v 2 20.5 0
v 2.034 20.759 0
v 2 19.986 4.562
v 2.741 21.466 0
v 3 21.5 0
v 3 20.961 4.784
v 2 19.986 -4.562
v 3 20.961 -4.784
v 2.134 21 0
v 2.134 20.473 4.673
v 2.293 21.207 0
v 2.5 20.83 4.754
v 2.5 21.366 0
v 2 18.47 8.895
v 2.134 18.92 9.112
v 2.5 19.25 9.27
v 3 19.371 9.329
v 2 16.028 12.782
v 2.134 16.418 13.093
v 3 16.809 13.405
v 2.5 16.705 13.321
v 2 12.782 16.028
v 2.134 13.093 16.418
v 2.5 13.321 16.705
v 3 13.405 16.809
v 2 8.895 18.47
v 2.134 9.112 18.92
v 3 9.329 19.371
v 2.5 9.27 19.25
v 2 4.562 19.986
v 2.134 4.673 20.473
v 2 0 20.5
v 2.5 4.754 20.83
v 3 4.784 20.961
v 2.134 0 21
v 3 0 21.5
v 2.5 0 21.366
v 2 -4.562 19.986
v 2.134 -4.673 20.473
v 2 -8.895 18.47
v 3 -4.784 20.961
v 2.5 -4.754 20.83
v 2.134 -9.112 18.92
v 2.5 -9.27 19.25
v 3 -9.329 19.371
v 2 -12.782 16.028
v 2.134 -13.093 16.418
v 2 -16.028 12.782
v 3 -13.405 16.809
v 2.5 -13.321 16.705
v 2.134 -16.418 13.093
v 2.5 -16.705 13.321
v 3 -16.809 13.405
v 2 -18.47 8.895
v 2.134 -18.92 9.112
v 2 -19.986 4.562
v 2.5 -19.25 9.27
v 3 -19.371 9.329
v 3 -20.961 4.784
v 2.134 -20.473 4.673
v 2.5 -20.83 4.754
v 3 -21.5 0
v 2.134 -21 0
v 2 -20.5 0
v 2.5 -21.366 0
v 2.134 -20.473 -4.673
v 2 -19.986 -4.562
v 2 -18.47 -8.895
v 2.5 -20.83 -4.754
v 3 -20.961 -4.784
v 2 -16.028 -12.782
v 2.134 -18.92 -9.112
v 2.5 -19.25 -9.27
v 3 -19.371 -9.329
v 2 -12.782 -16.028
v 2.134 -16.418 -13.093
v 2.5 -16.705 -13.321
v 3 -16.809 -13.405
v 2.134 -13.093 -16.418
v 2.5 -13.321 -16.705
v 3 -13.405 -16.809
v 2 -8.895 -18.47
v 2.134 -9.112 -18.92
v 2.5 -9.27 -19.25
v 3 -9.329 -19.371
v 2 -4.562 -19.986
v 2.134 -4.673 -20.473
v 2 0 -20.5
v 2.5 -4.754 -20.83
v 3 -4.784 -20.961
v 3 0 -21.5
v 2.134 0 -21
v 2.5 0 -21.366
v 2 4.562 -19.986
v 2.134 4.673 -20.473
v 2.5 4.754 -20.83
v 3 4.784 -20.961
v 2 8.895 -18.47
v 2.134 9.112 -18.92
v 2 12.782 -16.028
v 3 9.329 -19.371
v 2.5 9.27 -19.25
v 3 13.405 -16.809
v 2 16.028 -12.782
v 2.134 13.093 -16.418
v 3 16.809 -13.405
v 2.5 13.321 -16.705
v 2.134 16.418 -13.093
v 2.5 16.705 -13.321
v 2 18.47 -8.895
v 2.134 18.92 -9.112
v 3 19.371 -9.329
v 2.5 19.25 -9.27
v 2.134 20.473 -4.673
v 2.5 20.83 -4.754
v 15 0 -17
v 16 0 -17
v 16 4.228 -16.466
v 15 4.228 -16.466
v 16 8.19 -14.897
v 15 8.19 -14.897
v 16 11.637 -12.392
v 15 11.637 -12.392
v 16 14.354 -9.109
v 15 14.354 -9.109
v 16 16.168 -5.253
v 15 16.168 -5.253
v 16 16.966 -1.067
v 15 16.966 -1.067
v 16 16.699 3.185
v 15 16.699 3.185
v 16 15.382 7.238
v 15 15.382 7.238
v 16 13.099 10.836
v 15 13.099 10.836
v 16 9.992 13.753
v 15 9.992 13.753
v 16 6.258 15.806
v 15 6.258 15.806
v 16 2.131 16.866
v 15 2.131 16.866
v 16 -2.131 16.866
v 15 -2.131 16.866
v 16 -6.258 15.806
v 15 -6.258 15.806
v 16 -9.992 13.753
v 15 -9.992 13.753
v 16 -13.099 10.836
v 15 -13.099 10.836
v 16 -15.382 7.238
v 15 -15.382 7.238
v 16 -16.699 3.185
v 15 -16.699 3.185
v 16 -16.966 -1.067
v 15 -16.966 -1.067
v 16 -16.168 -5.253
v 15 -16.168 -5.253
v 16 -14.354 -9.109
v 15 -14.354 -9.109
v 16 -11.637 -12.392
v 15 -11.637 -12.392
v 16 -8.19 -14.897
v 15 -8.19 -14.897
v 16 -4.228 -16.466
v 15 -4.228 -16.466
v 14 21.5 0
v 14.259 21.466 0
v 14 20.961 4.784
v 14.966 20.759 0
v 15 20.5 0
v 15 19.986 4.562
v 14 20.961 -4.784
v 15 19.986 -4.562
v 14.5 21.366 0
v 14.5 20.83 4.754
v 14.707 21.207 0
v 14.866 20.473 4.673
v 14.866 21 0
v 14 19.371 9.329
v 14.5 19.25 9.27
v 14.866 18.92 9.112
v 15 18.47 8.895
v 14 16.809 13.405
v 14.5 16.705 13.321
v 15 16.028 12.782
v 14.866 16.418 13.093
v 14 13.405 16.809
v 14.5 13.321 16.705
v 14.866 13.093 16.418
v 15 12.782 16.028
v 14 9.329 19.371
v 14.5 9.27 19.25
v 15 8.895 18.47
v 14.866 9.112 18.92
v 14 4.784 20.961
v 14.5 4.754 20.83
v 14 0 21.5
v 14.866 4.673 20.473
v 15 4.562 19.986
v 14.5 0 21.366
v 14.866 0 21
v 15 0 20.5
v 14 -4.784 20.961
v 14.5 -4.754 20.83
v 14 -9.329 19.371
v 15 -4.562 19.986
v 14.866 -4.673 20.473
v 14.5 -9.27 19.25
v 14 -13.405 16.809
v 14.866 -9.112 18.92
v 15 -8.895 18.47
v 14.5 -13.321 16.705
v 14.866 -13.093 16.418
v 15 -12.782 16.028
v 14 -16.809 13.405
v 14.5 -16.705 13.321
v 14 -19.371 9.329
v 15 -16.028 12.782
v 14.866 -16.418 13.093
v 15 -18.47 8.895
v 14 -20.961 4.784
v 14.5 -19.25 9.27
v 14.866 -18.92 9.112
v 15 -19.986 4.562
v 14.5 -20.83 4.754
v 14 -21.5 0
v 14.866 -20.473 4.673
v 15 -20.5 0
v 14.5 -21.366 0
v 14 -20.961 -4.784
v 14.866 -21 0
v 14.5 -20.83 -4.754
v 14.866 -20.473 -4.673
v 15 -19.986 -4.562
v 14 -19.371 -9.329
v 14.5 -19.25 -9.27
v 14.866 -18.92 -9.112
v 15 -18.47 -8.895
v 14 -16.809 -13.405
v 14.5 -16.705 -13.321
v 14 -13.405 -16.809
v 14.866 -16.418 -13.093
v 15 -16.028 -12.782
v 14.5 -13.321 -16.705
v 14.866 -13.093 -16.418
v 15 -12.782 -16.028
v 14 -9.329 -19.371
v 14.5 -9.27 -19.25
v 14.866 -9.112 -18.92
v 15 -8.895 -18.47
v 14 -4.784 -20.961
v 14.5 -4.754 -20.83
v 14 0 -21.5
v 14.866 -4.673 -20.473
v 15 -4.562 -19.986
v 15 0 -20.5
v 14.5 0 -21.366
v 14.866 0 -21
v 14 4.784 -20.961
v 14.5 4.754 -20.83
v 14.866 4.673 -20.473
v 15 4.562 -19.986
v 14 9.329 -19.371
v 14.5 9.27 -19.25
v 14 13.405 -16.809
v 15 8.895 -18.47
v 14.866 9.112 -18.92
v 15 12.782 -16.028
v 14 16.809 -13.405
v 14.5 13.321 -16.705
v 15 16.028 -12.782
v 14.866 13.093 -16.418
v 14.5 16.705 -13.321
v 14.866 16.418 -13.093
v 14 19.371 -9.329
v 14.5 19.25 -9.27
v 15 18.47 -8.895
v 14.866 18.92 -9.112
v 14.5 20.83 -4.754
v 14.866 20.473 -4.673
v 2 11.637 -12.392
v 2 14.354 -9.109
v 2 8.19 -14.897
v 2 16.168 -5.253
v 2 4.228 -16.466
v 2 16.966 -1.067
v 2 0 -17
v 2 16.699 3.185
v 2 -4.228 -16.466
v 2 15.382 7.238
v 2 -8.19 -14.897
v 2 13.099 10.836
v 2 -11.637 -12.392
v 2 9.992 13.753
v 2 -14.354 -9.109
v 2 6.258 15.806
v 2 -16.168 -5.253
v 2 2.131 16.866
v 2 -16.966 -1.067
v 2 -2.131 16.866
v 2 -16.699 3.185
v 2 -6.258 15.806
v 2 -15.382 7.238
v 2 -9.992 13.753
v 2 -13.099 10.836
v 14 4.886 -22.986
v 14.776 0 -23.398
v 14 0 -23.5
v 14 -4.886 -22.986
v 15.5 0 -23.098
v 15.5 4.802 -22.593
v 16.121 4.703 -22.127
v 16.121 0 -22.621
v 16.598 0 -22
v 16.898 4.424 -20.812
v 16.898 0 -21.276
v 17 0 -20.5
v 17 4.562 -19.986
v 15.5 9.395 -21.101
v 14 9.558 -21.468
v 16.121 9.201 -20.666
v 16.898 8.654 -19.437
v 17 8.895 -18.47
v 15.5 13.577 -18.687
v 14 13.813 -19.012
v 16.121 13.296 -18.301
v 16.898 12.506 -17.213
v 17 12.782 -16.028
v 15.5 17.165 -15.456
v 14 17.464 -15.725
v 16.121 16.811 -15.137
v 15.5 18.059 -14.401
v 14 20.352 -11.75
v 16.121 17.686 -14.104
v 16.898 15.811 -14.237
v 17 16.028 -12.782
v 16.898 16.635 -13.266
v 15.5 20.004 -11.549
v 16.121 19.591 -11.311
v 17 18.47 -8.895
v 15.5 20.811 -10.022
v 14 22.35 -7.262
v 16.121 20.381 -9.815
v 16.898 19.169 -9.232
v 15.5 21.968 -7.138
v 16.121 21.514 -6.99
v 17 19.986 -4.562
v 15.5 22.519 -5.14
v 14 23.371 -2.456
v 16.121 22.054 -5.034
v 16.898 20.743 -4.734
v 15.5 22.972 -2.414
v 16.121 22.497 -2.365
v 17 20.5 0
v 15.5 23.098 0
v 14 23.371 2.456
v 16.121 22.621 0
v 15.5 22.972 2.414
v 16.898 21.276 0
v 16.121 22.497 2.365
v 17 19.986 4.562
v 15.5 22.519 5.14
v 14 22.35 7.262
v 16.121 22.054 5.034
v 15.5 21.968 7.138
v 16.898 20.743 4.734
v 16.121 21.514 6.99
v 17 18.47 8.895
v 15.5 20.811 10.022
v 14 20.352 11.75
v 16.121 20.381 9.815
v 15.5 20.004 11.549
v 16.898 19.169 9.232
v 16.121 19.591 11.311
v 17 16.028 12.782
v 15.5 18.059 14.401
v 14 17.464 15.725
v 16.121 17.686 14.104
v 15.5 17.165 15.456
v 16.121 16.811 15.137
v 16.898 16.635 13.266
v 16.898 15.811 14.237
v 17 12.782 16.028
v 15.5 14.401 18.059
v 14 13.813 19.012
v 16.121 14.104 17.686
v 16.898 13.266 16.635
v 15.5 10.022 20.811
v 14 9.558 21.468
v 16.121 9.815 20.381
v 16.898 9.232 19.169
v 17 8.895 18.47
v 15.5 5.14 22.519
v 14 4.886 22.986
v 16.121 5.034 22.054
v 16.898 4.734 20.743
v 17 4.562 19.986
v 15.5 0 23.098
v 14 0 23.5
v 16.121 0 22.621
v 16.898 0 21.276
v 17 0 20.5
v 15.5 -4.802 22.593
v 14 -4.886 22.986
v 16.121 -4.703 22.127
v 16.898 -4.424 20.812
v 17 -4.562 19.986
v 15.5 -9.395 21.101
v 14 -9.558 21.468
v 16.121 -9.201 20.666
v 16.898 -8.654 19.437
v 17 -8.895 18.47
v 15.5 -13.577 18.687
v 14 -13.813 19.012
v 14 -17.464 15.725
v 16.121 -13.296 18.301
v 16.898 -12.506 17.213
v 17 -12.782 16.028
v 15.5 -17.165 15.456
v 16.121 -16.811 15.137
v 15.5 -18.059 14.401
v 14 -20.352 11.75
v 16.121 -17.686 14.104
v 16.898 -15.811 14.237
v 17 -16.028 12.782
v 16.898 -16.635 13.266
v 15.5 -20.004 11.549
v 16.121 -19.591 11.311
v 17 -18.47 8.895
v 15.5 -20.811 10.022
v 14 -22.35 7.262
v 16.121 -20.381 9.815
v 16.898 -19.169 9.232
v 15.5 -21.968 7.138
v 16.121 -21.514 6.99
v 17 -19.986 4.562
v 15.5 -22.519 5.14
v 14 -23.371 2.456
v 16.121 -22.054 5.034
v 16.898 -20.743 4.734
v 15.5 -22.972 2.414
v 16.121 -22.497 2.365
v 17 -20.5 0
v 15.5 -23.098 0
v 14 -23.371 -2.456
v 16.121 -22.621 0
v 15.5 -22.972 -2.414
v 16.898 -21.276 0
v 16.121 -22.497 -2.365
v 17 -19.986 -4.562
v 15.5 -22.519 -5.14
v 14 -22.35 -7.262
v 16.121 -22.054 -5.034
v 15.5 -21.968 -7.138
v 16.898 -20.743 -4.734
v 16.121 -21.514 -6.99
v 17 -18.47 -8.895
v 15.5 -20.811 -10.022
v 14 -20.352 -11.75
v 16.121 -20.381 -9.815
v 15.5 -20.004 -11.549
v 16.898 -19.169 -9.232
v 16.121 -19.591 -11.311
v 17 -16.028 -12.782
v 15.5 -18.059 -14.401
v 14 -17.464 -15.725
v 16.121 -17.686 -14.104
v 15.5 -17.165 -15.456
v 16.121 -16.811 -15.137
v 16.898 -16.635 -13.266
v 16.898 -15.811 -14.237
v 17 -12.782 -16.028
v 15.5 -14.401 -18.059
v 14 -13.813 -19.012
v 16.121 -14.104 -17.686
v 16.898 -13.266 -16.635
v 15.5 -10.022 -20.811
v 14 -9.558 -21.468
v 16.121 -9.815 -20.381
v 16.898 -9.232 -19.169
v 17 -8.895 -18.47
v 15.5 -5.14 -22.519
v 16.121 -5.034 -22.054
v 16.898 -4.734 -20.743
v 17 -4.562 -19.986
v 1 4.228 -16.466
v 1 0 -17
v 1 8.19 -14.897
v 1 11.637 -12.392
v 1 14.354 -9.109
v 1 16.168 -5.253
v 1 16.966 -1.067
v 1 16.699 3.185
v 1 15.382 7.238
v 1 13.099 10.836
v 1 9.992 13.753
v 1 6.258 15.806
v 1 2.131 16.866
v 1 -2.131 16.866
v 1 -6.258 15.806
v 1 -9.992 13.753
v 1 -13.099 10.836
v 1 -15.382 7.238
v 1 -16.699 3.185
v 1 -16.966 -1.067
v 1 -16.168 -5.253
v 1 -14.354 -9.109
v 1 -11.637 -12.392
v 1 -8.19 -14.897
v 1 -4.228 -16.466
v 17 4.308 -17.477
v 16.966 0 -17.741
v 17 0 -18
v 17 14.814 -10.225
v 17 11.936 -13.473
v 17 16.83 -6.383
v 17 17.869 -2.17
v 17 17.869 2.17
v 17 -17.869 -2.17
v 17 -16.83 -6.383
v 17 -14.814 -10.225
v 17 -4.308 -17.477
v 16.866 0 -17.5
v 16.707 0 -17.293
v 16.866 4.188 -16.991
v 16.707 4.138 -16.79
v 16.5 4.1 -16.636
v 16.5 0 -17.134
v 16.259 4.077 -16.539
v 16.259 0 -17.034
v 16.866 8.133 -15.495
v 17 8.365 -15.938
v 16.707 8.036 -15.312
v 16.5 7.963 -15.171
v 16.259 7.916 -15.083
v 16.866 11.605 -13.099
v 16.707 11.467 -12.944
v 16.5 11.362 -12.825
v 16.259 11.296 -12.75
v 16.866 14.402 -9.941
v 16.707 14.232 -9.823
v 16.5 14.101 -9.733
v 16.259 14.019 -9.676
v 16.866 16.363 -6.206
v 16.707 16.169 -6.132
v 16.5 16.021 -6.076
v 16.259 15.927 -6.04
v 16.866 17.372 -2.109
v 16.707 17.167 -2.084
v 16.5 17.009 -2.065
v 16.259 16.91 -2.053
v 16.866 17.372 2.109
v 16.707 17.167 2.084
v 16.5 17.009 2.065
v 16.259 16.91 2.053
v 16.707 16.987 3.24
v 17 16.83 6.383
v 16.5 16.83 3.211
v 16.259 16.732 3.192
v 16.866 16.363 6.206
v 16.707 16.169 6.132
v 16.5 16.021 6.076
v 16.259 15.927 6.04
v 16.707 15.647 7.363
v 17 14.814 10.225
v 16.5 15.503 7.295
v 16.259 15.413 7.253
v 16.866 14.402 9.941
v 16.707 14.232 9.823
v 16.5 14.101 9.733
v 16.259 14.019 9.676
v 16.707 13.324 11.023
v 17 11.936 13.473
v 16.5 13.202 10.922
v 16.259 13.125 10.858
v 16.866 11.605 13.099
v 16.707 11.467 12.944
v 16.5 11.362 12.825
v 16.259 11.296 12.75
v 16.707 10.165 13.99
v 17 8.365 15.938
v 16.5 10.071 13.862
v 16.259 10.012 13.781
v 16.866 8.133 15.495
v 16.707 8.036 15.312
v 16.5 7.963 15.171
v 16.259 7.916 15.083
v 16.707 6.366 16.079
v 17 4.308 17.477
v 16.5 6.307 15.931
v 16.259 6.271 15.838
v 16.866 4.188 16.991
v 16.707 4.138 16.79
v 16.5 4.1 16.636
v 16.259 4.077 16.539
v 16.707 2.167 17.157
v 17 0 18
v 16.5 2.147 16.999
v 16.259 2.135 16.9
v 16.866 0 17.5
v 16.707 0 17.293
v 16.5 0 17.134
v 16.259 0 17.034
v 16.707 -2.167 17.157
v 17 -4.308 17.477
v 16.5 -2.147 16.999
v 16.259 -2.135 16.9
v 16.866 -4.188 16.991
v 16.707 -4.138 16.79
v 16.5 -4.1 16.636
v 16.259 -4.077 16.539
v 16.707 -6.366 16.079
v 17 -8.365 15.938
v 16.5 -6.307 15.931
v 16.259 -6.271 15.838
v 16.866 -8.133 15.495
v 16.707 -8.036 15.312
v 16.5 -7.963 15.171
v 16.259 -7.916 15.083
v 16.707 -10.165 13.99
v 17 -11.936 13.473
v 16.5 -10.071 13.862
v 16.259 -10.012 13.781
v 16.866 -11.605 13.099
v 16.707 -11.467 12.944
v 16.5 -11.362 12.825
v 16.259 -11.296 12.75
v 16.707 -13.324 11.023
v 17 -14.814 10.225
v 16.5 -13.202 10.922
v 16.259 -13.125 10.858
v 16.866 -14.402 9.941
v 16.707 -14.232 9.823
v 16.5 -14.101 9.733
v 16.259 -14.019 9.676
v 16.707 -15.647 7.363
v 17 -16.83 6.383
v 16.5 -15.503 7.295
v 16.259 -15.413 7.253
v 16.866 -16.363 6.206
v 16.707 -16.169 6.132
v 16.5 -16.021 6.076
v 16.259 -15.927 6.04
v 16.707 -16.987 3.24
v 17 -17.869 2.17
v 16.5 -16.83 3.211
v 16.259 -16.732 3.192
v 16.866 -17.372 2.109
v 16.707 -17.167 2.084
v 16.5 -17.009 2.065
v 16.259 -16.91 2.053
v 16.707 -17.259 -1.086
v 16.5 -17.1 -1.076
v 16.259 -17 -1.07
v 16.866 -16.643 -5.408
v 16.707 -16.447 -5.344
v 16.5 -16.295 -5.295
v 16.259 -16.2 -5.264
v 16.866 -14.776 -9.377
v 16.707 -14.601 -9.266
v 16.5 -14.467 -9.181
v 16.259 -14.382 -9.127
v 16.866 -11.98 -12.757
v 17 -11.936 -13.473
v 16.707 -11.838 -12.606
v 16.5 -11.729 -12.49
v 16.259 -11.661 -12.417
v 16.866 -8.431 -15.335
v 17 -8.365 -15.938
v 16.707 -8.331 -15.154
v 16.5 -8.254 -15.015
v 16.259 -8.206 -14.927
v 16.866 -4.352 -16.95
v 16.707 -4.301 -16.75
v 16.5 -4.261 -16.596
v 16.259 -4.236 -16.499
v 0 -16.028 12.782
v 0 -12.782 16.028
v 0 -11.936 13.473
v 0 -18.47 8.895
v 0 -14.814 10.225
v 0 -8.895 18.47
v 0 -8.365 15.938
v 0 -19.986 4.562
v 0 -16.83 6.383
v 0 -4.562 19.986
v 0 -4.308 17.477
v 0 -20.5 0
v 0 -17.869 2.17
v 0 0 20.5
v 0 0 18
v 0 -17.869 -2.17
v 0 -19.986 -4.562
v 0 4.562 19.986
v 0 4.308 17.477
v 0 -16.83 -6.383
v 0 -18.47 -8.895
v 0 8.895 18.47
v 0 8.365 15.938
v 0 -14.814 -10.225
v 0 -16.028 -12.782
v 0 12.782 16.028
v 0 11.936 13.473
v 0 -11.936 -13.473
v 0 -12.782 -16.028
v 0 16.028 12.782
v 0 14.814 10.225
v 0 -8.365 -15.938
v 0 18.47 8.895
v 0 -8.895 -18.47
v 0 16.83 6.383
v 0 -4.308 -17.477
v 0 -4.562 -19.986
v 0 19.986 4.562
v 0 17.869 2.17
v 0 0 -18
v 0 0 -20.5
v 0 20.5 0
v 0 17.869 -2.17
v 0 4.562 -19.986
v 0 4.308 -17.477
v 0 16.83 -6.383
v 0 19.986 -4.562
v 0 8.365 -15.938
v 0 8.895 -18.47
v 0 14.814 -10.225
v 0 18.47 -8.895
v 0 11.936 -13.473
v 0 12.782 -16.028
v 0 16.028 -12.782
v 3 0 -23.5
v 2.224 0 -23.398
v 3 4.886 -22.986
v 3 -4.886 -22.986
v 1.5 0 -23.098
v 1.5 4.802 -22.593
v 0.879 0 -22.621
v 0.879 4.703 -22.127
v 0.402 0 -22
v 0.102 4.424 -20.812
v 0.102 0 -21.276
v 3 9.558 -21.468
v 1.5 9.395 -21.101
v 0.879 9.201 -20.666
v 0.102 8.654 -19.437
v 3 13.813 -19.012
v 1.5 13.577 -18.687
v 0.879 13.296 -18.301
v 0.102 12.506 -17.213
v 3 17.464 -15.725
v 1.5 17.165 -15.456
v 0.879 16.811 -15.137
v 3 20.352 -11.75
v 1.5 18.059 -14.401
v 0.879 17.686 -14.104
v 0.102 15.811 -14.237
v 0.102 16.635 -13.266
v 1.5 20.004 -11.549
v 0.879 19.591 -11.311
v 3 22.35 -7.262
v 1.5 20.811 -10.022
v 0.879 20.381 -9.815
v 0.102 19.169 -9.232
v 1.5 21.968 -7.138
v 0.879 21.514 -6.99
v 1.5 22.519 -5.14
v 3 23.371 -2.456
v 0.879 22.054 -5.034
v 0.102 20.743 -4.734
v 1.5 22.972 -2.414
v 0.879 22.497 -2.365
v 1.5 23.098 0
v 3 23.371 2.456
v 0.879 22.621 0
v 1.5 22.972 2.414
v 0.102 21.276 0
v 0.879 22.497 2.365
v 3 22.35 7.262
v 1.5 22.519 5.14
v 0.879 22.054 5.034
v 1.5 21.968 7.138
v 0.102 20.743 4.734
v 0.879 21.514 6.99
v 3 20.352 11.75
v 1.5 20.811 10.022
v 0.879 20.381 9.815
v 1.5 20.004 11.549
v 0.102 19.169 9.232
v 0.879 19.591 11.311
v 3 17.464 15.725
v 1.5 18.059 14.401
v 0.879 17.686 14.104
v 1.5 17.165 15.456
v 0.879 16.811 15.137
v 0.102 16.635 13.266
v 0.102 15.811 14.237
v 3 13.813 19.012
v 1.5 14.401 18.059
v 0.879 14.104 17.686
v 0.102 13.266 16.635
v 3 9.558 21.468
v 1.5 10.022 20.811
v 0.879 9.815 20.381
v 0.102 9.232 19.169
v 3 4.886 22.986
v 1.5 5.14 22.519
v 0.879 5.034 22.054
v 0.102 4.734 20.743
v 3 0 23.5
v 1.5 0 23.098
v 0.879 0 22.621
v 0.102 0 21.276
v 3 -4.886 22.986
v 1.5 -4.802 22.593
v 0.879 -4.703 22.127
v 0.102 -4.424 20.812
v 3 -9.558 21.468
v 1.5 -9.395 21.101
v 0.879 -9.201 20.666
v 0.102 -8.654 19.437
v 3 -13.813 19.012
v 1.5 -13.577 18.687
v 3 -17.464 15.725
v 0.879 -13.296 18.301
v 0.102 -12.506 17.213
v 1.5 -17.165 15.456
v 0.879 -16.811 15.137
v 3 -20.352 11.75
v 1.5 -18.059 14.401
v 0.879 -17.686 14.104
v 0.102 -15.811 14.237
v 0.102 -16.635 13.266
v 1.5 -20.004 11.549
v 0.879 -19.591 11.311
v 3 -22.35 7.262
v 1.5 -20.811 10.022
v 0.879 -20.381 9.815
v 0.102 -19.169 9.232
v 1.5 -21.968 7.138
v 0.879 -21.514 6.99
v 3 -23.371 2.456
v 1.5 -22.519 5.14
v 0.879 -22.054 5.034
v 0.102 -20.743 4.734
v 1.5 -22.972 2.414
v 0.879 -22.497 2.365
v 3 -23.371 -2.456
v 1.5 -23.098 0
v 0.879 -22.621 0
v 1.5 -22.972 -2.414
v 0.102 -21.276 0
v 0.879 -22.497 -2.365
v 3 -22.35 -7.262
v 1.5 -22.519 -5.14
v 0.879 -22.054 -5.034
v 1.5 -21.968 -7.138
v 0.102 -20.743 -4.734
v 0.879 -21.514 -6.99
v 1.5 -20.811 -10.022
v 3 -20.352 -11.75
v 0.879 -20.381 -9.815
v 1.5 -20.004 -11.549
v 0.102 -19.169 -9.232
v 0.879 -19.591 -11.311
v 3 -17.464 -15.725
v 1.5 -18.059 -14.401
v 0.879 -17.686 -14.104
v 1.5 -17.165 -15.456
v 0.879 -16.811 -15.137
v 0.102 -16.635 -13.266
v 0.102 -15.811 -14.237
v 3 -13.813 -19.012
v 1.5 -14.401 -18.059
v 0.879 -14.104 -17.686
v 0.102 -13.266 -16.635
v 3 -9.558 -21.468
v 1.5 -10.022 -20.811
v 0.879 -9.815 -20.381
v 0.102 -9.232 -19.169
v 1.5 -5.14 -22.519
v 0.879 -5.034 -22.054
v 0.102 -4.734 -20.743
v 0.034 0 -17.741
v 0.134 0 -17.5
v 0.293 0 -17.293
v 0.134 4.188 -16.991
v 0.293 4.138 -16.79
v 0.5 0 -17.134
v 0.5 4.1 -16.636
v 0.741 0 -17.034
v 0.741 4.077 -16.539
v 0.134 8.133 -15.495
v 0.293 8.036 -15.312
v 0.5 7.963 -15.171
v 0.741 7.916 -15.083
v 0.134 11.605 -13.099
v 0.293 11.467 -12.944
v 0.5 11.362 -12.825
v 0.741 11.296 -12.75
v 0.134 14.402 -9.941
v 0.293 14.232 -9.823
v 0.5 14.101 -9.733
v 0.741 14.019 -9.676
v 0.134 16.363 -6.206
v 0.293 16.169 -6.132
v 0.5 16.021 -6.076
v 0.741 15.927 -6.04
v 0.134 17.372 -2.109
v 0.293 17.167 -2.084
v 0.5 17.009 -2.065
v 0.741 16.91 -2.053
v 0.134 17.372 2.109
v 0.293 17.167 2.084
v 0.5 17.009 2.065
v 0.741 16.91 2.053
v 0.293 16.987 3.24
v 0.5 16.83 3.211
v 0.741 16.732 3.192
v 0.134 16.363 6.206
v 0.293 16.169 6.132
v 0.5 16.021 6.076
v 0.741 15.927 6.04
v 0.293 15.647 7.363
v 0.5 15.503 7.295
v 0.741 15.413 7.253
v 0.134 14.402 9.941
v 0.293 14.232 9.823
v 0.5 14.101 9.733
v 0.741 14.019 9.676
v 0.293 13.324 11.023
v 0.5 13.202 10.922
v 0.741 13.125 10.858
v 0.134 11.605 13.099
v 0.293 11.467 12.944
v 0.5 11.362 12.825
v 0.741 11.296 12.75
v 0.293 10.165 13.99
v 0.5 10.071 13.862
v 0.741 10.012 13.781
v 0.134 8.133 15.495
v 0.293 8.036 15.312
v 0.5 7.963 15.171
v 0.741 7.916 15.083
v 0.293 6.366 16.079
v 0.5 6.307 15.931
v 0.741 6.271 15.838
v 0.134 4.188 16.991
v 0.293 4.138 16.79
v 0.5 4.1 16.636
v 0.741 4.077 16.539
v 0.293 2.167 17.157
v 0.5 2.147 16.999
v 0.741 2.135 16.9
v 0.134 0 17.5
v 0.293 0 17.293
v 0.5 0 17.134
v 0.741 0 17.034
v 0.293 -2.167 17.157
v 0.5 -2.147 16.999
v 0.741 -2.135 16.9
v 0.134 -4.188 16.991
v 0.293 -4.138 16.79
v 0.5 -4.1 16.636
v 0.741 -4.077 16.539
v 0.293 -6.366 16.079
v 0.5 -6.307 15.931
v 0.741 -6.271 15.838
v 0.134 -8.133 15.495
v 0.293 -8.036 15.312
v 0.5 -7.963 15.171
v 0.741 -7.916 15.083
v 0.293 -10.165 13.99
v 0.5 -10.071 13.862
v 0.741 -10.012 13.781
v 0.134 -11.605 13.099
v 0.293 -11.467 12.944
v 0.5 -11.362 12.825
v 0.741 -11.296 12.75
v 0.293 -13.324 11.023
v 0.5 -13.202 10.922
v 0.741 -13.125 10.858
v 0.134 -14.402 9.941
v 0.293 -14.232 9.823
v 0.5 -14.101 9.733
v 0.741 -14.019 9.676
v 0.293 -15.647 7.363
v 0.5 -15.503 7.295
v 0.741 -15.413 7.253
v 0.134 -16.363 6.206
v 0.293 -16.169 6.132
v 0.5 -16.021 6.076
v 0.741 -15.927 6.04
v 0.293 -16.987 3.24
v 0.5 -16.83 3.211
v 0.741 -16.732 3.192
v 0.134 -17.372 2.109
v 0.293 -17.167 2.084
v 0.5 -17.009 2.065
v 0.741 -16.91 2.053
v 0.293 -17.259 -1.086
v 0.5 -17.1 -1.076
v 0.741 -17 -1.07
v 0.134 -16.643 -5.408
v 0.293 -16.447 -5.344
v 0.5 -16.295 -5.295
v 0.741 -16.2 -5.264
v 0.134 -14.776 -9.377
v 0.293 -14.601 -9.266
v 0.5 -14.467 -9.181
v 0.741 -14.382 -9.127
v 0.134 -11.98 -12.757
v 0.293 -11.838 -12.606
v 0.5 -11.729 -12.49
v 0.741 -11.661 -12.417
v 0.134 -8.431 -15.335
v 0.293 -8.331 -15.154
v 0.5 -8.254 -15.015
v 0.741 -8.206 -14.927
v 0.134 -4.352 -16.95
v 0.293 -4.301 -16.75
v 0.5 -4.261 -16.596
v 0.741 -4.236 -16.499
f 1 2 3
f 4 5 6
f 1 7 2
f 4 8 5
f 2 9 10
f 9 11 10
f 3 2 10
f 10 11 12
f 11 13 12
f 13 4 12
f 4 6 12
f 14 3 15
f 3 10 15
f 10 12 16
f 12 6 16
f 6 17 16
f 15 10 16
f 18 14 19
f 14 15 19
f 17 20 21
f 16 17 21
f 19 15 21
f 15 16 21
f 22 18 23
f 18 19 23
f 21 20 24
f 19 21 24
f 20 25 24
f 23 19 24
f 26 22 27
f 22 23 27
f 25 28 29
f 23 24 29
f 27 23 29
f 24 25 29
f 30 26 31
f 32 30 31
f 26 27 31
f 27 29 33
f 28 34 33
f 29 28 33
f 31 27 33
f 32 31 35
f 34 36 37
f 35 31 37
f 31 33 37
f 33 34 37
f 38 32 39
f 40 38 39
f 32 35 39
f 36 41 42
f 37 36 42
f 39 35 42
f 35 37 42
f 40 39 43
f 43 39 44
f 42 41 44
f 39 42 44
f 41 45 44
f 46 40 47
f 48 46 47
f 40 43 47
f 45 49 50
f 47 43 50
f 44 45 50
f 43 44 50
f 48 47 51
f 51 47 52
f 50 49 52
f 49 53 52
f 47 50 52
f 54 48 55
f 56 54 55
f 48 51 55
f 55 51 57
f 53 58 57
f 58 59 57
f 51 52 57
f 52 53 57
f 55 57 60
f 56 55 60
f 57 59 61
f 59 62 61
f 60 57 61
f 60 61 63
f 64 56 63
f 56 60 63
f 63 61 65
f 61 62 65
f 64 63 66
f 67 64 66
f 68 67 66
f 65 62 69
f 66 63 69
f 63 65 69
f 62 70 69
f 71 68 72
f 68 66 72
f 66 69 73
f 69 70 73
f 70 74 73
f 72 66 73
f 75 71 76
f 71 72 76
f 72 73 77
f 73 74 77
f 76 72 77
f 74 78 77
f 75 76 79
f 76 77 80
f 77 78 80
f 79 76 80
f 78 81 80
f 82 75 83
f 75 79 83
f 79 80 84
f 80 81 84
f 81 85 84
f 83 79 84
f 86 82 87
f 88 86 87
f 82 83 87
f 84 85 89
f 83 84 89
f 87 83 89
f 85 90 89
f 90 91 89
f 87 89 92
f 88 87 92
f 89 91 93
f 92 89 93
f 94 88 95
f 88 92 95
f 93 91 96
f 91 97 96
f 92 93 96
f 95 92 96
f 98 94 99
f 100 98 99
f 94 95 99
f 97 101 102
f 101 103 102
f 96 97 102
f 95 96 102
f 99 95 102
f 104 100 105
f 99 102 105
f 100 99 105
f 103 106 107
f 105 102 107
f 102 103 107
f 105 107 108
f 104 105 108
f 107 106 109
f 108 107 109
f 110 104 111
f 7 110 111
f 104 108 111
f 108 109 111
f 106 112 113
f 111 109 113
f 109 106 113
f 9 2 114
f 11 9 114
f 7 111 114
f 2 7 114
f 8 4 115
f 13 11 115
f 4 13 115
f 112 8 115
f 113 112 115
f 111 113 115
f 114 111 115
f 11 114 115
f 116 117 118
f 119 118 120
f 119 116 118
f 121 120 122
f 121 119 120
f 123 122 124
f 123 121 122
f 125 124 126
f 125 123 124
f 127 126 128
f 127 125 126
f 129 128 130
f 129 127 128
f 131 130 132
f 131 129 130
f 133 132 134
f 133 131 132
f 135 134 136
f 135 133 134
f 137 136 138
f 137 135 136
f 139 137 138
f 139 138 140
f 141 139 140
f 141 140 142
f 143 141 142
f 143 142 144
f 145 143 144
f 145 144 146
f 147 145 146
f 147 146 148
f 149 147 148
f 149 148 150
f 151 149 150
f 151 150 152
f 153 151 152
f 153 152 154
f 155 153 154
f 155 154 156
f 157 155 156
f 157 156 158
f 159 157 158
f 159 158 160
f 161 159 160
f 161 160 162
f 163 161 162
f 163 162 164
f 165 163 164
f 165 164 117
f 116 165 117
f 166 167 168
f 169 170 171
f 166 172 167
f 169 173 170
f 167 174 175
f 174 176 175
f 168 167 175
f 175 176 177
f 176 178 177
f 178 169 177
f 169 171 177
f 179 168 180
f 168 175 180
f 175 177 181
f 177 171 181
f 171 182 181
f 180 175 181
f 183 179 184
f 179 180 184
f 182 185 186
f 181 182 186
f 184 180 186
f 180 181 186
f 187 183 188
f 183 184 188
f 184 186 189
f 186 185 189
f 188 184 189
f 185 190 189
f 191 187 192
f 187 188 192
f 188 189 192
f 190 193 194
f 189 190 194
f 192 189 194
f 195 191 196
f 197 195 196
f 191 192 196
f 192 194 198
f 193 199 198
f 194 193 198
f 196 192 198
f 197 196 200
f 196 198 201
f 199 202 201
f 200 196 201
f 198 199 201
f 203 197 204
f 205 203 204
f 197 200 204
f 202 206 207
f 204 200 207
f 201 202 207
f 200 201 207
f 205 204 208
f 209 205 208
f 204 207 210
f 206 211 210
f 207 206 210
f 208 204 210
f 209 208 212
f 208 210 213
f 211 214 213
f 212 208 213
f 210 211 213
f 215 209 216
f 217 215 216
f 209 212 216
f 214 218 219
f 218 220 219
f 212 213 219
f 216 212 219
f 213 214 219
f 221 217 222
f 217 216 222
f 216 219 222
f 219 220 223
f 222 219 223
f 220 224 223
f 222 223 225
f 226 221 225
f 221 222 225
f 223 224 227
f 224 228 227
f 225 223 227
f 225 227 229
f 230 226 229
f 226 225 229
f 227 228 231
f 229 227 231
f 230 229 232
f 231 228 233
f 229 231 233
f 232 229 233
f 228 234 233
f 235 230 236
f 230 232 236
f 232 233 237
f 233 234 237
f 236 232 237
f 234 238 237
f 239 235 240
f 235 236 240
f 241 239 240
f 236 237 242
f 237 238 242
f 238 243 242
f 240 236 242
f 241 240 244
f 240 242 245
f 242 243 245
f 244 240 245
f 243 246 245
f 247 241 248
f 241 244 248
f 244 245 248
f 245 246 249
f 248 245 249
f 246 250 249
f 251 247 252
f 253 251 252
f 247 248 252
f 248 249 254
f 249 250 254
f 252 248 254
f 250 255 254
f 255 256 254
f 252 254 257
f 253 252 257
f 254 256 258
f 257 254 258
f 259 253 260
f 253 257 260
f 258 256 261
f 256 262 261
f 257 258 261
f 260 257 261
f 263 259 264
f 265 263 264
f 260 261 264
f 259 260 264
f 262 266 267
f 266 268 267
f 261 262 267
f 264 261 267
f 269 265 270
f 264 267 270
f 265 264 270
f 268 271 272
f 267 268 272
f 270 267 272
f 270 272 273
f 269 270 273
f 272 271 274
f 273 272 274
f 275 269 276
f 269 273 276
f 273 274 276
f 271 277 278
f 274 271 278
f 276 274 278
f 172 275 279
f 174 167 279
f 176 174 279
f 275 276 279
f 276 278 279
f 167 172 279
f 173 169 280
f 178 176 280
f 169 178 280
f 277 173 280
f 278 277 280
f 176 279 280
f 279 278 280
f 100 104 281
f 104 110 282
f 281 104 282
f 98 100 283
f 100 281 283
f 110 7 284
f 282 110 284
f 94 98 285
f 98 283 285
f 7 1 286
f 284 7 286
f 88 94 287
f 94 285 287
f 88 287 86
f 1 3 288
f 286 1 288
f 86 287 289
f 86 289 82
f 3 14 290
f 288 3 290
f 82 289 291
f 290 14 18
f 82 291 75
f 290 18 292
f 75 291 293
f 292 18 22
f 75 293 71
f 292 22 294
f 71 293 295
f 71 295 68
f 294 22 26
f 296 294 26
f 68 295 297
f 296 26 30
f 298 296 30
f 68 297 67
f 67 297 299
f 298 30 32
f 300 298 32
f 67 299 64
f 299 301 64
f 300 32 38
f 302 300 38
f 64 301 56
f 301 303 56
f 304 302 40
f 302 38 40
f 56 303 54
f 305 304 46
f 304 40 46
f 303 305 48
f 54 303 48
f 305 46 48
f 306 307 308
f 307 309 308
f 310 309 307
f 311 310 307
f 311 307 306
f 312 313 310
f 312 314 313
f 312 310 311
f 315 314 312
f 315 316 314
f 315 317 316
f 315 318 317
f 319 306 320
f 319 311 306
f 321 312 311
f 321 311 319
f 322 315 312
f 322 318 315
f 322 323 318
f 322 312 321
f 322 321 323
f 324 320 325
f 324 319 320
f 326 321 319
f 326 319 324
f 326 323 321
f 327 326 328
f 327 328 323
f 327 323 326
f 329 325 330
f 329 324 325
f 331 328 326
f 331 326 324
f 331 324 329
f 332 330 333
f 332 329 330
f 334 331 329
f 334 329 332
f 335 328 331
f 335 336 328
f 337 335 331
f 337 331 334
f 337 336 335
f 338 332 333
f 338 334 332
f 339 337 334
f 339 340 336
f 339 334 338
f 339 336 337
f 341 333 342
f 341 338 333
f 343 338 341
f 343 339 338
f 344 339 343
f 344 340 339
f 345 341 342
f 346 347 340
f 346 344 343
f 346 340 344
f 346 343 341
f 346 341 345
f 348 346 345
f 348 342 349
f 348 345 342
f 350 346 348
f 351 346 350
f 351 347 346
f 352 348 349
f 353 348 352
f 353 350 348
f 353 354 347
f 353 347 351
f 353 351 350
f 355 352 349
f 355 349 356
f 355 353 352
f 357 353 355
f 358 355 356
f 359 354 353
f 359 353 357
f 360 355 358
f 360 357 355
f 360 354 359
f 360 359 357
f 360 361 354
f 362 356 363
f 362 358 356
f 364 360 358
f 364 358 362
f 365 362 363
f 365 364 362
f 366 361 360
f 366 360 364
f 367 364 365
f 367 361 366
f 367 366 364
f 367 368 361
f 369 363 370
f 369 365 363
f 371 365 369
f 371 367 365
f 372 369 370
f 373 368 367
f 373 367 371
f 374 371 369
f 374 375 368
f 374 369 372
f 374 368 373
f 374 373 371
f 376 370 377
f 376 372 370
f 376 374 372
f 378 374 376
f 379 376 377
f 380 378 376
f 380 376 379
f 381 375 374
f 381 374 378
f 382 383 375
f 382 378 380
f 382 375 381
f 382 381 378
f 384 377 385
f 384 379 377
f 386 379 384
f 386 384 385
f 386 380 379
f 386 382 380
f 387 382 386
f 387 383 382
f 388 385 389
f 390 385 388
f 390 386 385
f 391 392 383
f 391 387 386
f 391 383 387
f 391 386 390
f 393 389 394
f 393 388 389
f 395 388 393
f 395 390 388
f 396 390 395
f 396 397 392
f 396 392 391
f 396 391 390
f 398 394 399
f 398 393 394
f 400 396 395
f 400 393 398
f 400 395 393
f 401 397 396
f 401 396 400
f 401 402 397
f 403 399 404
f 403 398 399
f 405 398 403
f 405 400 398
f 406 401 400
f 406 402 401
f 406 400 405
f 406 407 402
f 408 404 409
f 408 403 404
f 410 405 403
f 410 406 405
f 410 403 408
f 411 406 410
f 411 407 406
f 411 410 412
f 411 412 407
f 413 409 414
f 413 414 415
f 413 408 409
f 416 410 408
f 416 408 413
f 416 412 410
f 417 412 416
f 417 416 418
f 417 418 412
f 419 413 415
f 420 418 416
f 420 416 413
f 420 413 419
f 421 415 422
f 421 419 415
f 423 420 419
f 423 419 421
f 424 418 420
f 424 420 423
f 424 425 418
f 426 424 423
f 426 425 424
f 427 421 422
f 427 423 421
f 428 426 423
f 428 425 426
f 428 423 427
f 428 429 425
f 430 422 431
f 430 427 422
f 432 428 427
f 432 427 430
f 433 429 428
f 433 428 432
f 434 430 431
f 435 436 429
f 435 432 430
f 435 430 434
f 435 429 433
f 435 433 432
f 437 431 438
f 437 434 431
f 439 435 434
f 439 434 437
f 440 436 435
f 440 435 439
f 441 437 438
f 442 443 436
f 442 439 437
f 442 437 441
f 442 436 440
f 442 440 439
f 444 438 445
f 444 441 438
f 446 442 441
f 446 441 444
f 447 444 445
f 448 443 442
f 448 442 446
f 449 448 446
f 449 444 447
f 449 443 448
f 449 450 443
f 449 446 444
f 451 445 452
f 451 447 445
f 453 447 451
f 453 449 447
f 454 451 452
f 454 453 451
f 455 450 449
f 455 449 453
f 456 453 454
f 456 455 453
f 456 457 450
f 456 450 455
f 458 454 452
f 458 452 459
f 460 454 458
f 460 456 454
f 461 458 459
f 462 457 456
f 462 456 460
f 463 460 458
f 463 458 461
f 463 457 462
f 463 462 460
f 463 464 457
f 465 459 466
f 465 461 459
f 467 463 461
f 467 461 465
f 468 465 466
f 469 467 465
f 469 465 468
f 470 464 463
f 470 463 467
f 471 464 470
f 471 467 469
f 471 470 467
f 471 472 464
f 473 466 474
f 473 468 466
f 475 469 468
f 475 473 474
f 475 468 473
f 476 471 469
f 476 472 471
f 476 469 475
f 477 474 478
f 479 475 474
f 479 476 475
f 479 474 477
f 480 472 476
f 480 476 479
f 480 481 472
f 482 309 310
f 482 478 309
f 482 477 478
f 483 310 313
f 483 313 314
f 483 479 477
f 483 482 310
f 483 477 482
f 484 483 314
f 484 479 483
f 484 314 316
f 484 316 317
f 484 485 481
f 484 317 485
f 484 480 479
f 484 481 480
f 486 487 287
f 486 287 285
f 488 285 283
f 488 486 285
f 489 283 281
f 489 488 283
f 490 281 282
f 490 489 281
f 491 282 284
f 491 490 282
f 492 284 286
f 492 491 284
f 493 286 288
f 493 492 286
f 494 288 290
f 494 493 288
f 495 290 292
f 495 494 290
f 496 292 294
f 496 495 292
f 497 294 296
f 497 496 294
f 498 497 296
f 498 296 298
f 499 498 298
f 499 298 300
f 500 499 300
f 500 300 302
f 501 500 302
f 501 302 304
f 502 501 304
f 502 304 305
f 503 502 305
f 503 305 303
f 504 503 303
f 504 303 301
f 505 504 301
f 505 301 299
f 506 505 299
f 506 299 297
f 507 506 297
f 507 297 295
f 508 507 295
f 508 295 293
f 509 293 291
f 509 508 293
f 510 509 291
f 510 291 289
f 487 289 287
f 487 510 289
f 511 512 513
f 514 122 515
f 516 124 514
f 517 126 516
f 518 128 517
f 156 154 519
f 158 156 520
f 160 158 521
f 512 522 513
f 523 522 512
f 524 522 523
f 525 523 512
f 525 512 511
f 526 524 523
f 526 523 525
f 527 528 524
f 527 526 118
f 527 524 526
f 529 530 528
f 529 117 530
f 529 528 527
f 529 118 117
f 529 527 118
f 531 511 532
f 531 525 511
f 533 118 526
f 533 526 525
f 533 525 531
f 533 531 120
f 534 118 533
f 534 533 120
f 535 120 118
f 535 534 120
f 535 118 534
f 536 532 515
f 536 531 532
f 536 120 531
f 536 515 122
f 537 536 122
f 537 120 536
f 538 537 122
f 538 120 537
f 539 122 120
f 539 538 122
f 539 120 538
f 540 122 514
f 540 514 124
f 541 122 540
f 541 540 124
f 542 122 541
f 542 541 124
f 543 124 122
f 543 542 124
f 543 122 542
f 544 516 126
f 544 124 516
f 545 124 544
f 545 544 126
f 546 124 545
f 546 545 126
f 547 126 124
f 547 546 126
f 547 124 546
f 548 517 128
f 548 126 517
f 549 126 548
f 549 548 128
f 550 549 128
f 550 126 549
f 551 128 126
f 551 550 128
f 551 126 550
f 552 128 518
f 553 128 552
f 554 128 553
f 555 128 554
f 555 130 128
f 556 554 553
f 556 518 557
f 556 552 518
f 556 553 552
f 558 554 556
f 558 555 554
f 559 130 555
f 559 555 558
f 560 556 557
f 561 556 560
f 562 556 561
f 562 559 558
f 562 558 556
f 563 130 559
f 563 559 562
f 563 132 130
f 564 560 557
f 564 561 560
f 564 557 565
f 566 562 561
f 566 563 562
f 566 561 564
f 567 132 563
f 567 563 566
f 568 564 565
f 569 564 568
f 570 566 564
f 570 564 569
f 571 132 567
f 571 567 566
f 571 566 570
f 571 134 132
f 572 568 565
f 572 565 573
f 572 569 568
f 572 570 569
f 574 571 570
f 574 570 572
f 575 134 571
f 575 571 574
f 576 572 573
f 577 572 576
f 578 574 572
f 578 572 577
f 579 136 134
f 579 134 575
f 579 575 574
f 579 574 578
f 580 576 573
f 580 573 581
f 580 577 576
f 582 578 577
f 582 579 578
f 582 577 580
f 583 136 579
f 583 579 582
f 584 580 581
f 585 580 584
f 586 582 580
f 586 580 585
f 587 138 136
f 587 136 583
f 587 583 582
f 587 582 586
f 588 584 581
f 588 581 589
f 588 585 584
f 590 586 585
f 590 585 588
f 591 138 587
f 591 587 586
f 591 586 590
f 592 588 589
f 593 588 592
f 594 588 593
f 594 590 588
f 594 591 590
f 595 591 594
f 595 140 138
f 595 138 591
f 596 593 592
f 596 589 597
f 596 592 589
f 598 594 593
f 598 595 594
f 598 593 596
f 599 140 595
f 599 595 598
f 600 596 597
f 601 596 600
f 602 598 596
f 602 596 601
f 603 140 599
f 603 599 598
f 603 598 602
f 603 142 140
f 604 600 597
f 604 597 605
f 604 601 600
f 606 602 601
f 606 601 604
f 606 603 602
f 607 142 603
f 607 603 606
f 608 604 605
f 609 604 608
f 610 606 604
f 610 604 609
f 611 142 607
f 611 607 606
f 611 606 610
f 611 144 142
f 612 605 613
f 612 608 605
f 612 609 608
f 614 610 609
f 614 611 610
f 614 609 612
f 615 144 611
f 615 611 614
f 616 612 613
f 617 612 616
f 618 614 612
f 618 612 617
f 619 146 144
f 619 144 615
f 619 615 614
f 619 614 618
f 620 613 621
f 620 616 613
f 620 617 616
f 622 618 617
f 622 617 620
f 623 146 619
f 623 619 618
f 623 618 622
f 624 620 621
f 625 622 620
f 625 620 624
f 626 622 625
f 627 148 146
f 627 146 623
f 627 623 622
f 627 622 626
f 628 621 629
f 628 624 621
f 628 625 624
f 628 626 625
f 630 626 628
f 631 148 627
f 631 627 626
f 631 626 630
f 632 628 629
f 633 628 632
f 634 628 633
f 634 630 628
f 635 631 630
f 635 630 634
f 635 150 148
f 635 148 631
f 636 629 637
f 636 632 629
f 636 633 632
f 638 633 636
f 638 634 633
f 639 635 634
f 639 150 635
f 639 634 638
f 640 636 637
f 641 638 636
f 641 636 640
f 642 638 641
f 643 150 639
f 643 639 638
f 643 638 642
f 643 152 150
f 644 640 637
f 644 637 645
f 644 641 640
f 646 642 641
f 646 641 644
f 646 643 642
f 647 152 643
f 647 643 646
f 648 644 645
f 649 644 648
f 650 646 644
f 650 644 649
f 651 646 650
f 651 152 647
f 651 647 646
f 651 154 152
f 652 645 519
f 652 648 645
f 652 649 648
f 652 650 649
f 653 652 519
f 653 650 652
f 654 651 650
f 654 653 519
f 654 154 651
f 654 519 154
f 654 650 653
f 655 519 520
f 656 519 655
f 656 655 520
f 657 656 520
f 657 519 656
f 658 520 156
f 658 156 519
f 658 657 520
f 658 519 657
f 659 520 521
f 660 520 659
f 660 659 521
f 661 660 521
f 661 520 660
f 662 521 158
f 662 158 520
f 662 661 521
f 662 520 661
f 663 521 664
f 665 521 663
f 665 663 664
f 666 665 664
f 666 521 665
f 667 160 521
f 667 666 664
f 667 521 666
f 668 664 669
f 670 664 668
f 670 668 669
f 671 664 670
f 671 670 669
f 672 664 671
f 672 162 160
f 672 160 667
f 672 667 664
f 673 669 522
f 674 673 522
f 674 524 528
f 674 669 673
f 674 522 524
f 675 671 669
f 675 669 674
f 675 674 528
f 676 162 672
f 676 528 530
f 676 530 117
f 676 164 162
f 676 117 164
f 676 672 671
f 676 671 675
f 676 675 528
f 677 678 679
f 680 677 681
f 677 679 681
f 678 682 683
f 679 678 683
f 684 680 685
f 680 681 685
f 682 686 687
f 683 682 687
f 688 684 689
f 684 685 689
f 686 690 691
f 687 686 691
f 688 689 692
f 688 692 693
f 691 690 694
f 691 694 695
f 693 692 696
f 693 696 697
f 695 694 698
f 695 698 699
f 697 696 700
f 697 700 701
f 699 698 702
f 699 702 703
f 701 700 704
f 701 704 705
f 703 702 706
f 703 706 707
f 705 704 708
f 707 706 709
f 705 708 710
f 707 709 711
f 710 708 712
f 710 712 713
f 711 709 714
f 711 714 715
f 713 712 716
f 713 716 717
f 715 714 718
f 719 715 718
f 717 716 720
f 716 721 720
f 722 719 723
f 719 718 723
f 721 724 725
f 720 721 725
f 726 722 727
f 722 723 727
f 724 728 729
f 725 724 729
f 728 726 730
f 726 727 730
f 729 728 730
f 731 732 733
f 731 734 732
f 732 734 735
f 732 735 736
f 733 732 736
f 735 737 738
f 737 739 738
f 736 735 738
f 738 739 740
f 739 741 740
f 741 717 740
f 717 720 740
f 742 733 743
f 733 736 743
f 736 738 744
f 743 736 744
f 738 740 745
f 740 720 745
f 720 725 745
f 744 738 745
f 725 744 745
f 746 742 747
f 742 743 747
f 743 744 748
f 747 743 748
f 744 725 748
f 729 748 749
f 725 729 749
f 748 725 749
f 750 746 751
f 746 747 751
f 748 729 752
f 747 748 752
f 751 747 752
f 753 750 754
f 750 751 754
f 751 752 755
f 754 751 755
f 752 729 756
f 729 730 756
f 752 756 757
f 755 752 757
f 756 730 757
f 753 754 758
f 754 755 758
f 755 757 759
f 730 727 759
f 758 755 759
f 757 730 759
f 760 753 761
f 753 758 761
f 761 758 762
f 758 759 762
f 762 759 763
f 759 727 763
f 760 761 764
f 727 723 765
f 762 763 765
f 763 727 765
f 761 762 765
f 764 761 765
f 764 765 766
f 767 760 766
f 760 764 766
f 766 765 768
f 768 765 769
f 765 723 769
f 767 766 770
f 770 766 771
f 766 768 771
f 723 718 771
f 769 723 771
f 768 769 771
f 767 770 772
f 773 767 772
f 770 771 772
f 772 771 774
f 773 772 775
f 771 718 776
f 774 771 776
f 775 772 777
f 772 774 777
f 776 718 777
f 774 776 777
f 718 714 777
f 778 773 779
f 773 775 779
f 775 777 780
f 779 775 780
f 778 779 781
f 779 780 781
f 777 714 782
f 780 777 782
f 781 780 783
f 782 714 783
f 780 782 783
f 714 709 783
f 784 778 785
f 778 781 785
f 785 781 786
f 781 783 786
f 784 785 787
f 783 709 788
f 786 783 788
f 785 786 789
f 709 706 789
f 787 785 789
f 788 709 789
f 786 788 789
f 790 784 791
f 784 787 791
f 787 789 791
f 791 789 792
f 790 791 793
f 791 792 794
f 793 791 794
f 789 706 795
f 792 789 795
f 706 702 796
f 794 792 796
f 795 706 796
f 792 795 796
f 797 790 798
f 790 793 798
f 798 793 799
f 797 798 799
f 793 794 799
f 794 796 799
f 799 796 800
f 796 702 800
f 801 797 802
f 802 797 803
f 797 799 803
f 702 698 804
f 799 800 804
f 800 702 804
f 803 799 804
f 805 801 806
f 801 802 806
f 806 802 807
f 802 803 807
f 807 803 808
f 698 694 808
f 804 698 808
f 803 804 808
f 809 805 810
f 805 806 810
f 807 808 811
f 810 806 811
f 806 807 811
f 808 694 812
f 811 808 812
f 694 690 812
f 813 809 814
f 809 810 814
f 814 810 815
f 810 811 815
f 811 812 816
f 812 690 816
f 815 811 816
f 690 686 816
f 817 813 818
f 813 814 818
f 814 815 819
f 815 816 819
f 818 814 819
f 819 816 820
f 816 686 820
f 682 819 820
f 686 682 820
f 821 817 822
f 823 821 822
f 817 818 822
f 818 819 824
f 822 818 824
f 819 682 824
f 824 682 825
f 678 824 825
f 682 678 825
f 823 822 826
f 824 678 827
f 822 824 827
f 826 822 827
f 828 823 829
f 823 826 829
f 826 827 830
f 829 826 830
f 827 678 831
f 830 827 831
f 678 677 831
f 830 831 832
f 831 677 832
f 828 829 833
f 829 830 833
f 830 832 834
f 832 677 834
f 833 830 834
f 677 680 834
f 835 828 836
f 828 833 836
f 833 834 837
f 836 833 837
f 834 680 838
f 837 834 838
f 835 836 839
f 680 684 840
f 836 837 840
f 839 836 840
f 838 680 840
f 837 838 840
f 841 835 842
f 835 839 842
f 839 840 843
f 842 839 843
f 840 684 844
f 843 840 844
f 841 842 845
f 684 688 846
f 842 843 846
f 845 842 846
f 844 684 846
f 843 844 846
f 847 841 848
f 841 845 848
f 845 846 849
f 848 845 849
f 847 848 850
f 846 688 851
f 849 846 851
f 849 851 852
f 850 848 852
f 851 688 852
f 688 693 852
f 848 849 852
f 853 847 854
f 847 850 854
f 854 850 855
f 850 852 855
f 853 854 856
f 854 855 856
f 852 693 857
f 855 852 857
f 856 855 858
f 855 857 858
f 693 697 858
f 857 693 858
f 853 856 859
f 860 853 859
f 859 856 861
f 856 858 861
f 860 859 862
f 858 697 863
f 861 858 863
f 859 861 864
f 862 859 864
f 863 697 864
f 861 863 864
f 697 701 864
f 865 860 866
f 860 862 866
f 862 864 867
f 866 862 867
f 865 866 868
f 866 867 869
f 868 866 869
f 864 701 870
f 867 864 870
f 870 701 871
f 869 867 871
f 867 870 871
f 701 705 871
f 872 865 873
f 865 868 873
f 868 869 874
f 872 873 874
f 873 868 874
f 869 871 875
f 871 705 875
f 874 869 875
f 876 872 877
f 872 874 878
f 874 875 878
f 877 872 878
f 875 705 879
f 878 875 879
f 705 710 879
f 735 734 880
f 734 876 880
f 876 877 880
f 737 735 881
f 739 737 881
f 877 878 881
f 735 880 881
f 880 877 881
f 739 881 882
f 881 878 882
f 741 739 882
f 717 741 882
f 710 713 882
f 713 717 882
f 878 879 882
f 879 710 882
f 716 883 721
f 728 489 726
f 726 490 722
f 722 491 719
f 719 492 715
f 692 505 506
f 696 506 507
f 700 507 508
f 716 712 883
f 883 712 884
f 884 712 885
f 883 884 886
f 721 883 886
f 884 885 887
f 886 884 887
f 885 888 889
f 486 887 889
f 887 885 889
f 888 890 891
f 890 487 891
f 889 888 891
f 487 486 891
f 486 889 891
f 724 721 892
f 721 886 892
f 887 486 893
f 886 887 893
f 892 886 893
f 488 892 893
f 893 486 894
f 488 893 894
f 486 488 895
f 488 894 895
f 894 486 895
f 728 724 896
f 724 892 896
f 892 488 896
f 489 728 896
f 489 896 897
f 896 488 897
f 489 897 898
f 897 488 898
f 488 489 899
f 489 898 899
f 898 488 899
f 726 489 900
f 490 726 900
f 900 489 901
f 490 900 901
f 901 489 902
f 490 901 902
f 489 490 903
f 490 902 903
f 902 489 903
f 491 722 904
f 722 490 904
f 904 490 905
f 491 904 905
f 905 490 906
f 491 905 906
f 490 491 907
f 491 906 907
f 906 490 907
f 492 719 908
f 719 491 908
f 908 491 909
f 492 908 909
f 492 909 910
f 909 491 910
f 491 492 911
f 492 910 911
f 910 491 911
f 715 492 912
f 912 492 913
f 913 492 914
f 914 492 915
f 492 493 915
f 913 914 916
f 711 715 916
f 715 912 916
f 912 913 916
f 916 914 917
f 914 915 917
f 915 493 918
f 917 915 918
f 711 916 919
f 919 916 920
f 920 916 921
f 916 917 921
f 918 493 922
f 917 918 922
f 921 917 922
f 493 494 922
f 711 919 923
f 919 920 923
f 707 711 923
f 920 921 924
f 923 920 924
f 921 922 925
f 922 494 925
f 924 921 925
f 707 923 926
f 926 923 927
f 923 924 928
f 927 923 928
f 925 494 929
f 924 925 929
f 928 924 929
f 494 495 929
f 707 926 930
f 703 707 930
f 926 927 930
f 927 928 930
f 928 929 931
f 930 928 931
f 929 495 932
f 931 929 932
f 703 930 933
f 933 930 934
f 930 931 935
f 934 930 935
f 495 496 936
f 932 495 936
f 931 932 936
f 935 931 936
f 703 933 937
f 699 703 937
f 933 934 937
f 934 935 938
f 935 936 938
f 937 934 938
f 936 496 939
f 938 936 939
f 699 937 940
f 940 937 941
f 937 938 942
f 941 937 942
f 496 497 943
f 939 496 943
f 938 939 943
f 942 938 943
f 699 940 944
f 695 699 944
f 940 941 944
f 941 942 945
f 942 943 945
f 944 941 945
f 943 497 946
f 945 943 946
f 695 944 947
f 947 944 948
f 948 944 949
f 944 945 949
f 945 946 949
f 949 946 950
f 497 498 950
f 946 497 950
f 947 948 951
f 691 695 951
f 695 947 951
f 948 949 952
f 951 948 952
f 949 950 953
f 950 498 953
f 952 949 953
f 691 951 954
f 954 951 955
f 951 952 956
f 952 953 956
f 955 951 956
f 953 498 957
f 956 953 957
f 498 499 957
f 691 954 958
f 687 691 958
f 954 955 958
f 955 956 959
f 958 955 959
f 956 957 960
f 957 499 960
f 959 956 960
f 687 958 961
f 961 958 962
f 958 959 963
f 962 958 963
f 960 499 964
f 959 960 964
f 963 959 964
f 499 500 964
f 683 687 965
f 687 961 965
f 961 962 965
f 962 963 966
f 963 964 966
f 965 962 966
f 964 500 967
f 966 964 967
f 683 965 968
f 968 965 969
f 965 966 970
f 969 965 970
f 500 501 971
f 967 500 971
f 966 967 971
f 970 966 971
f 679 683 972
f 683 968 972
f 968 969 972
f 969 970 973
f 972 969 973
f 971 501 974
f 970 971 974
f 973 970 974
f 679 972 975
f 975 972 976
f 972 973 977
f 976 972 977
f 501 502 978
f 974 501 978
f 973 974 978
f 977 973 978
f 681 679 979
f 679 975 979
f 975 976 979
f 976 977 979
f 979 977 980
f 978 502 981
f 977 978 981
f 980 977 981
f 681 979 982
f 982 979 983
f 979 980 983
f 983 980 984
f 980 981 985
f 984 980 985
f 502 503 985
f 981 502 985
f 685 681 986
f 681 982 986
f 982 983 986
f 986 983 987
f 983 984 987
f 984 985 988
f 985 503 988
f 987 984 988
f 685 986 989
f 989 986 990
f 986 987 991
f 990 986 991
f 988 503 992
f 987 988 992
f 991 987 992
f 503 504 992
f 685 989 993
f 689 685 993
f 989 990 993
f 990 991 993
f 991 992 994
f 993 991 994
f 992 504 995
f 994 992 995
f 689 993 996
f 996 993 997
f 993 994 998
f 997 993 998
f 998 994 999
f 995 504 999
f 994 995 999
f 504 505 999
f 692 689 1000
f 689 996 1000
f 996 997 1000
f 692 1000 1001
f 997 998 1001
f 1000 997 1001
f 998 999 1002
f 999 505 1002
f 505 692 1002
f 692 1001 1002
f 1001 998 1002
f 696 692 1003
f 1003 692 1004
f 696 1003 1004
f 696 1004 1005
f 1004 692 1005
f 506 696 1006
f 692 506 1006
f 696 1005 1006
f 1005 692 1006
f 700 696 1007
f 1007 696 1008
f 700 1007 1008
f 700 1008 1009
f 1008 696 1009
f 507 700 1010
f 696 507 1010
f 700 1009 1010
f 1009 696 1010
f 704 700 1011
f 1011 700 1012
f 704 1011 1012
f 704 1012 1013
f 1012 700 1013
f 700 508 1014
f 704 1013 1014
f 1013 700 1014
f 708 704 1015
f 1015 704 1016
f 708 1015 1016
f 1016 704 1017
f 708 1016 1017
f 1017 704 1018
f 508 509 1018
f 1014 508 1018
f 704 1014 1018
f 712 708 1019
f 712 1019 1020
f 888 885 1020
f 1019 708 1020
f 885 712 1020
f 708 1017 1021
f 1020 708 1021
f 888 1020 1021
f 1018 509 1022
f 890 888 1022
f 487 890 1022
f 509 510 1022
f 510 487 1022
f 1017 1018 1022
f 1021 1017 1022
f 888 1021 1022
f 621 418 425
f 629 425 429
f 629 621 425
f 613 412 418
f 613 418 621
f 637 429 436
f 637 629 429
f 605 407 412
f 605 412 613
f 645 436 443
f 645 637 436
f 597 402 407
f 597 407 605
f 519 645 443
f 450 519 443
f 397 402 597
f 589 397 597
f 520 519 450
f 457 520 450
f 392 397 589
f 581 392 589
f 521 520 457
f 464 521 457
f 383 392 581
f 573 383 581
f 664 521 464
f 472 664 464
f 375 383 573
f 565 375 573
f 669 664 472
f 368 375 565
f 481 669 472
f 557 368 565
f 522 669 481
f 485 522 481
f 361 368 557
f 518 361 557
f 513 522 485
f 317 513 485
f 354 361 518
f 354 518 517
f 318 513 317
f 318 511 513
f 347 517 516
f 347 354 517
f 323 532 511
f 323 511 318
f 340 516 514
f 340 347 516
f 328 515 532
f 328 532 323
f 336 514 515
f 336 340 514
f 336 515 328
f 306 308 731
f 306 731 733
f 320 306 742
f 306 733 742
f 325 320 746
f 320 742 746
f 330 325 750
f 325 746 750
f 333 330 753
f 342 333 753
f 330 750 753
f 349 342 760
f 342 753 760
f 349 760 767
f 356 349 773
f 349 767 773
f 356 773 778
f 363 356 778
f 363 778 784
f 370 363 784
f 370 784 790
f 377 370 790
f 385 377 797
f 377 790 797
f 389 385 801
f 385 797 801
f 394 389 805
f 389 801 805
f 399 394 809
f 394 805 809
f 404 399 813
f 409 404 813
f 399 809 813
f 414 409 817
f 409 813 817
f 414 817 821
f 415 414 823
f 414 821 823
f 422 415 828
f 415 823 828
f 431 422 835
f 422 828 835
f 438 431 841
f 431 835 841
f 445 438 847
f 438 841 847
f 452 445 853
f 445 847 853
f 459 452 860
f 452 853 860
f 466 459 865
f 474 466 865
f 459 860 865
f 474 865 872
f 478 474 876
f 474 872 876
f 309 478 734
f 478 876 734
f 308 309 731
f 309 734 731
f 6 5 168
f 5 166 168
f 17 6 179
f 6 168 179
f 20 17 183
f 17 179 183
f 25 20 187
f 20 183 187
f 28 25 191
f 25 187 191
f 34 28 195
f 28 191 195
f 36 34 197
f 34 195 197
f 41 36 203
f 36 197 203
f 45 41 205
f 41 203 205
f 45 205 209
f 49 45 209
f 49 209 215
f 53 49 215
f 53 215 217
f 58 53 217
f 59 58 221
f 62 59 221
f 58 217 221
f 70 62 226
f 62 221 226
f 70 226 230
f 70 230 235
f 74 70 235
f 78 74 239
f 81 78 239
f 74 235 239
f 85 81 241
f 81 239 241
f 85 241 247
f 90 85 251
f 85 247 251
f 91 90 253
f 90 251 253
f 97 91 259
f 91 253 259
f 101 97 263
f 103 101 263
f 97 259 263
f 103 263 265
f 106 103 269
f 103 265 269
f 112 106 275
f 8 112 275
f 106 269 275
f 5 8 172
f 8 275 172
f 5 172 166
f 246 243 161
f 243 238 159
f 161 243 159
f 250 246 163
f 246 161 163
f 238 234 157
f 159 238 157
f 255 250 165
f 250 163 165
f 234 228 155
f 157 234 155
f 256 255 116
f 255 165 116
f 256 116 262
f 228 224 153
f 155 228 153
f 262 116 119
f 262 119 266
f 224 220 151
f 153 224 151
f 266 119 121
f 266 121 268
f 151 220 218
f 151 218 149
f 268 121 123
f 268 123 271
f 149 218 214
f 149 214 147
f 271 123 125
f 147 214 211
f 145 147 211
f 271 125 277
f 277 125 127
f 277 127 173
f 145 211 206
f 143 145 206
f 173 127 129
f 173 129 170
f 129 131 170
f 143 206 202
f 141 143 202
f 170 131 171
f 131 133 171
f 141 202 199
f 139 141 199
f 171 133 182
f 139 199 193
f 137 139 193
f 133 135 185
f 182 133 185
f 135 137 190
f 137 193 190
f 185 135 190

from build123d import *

# Parameters (mm, degrees)
SKETCH1_R           = 23.5
SKETCH1_R_2         = 17
BOSS_EXTRUDE2_DEPTH = 17
FILLET1_R           = 3
FILLET2_R           = 1


# Read off the part's stored shape, not the designer's step: Shell1
with BuildPart() as part:
    # Sketch1 → Boss-Extrude2 (new body)
    with BuildSketch(Plane(origin=(0, 0, 0), x_dir=(0, 0, -1), z_dir=(1, 0, 0))):
        Circle(SKETCH1_R)
        Circle(SKETCH1_R_2, mode=Mode.SUBTRACT)
    extrude(amount=BOSS_EXTRUDE2_DEPTH)

    # Fillet1
    fillet1_edges = [part.edges().sort_by_distance(p)[0] for p in [
        (0, 0, 23.5),
        (17, 0, 23.5),
    ]]
    fillet(fillet1_edges, radius=FILLET1_R)

    # Fillet2
    fillet2_edges = [part.edges().sort_by_distance(p)[0] for p in [
        (0, 0, 17),
        (17, 0, 17),
    ]]
    fillet(fillet2_edges, radius=FILLET2_R)

    # Shell1 outline → Shell1 (revolve, cut)
    with BuildSketch(Plane.YX):
        with BuildLine():
            Line((20.5, 15), (17, 15))
            Line((17, 15), (17, 2))
            Line((17, 2), (20.5, 2))
            ThreePointArc((20.5, 2), (21.207106781, 2.292893219), (21.5, 3))
            Line((21.5, 3), (21.5, 14))
            ThreePointArc((21.5, 14), (21.207106781, 14.707106781), (20.5, 15))
        make_face()
    revolve(axis=Axis((0, 0, 0), (1, 0, 0)), mode=Mode.SUBTRACT)


solid = part.part
